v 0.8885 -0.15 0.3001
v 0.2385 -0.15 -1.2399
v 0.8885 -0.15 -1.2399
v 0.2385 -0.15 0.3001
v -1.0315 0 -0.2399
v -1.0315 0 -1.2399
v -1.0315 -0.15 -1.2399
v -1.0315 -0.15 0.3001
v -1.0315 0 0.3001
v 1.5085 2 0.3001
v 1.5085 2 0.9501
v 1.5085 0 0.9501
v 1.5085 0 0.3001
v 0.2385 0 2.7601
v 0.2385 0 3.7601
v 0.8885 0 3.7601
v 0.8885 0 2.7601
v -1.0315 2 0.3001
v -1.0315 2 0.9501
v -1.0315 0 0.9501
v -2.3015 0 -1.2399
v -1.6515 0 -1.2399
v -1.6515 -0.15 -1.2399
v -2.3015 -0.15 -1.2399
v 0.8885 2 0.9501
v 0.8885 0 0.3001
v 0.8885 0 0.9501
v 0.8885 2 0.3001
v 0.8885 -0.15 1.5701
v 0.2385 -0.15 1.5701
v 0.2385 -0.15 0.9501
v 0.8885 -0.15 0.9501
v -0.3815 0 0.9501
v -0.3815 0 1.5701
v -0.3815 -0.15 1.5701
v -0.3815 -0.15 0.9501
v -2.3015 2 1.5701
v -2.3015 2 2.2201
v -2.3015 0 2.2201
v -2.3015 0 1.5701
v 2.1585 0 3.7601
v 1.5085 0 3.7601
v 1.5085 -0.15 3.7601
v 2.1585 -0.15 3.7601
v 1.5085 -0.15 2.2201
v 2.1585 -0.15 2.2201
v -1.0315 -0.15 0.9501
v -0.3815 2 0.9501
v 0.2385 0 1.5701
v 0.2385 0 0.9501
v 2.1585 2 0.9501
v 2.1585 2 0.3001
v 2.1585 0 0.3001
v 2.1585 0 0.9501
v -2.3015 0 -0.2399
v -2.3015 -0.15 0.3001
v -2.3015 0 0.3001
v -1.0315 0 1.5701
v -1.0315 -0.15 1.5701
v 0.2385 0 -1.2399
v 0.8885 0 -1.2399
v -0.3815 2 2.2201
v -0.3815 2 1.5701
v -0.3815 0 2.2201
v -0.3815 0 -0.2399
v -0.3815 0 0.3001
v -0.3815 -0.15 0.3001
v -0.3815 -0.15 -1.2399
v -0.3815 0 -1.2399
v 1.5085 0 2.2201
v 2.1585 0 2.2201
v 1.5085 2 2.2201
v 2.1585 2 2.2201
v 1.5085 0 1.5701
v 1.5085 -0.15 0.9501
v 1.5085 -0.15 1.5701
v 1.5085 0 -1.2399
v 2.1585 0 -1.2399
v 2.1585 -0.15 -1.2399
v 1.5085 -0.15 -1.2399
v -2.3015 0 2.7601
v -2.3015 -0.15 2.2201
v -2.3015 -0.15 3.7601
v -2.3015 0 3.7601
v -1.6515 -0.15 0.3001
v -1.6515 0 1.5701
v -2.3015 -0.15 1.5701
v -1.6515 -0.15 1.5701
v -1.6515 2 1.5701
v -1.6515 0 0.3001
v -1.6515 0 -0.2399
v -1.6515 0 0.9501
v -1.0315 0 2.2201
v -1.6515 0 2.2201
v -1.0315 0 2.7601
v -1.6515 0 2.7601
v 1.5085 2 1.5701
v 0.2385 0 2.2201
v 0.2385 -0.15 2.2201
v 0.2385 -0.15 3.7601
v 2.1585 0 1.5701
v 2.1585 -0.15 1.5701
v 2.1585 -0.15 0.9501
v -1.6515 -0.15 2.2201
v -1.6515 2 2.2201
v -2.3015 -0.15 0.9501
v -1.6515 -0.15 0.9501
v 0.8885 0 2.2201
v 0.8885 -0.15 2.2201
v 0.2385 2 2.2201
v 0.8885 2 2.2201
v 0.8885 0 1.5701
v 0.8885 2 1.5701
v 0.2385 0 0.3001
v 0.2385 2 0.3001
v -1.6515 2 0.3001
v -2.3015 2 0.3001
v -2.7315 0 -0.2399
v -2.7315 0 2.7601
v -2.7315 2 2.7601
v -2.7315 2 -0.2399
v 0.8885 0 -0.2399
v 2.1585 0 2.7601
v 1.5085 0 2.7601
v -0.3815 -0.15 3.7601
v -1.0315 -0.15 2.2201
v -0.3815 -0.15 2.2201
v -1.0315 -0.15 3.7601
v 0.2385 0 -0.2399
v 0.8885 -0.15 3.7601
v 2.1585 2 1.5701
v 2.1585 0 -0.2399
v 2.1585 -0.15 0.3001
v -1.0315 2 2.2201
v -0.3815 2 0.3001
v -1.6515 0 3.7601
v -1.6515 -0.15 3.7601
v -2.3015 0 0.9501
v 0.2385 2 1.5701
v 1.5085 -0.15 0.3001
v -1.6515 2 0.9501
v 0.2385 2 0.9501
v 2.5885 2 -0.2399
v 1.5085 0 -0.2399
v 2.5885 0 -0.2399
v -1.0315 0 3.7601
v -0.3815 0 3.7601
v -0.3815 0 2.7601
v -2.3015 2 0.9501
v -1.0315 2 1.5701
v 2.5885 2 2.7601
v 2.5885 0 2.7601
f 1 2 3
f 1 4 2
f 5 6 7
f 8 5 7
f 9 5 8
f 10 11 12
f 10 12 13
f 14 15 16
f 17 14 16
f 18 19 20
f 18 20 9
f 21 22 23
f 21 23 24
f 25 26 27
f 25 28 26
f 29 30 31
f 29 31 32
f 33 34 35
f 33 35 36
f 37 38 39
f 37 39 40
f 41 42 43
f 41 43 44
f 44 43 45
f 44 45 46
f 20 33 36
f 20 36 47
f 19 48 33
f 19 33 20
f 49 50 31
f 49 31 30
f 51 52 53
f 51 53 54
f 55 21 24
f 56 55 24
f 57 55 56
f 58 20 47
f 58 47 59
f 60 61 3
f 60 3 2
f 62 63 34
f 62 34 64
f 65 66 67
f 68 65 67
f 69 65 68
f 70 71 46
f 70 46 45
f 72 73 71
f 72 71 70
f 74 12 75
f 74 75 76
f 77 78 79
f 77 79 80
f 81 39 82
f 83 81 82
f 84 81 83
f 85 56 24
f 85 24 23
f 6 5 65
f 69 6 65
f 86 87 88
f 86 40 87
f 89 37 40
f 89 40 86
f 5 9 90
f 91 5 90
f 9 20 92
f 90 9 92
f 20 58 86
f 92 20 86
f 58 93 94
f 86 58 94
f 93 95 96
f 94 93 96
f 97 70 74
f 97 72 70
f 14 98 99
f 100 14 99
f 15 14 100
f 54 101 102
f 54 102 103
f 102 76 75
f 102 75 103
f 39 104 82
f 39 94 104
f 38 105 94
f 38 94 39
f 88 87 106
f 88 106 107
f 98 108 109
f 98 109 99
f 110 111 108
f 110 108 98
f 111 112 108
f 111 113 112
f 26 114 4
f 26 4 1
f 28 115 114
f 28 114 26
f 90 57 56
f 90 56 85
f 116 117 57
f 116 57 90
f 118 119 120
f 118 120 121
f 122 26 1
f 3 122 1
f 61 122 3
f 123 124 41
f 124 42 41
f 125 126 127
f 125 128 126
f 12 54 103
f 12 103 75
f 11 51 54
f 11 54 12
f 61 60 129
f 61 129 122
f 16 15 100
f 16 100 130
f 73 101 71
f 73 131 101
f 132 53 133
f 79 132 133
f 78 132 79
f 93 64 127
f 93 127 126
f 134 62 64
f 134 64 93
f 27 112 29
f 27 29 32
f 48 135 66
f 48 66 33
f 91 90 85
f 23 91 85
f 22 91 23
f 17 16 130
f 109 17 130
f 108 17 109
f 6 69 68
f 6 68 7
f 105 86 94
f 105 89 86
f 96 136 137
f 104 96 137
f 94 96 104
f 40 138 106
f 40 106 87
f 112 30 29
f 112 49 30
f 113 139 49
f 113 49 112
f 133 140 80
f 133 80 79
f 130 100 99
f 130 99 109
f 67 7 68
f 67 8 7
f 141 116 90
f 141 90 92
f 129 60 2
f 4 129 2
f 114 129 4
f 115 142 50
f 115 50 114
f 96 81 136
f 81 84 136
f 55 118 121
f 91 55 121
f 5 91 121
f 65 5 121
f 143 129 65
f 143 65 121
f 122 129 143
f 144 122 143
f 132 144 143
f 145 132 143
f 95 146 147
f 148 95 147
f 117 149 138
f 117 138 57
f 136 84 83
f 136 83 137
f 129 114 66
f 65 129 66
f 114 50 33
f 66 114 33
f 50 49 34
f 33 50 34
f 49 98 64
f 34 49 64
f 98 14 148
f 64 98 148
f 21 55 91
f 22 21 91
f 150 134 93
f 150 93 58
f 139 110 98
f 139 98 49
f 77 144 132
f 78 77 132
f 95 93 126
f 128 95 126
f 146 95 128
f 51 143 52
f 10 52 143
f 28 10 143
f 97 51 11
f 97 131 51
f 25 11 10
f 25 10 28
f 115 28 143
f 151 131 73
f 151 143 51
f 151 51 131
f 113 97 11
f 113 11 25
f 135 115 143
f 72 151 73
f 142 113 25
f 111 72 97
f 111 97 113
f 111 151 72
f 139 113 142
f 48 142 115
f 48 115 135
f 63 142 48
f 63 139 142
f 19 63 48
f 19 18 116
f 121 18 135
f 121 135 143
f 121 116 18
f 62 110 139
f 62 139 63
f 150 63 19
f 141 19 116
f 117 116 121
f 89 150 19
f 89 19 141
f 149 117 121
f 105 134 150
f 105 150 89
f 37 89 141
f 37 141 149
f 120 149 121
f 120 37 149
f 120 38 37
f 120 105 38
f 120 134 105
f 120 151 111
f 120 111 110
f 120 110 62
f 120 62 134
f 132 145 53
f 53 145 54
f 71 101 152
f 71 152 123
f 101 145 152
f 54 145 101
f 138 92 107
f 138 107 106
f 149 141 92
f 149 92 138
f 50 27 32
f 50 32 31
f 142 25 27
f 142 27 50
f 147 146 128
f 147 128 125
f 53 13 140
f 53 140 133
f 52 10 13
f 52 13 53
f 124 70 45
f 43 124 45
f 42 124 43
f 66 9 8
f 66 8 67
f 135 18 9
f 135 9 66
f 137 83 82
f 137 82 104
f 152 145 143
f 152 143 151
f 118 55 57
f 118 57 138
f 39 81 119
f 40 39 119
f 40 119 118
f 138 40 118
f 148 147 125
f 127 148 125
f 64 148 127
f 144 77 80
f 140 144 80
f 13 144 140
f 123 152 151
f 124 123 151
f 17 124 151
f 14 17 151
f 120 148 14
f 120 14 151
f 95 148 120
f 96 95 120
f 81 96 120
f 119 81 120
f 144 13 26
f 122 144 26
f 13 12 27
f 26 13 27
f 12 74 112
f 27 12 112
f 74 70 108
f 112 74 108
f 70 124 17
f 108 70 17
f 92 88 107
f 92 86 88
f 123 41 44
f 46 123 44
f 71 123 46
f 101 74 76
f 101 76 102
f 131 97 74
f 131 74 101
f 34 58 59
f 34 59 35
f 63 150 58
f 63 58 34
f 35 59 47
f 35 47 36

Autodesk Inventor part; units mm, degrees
ref_plane "YZ Plane" through (0, 0, 0) normal (1, 0, 0) x (0, 1, 0)
ref_plane "XZ Plane" through (0, 0, 0) normal (0, 1, 0) x (-1, 0, 0)
ref_plane "XY Plane" through (0, 0, 0) normal (0, 0, 1) x (1, 0, 0)
sketch "Sketch1" plane through (0, 0, 0) normal (0, 1, 0) x (-1, 0, 0)
  line L0 (-2.5885, 2.7601) -> (2.7315, 2.7601)
  line L1 (2.7315, 2.7601) -> (2.7315, -0.2399)
  line L2 (2.7315, -0.2399) -> (-2.5885, -0.2399)
  line L3 (-2.5885, -0.2399) -> (-2.5885, 2.7601)
  point P0 (0, 0)
  dimension "d0" = 5.32
  dimension "d1" = 3
extrude "Extrusion1" add sketch "Sketch1" along normal blind 2
sketch "Sketch2" plane through (0, 0, 0) normal (0, -1, 0) x (1, 0, 0)
  line L0 (-2.7315, 2.7601) -> (-2.7315, -0.2399) projected
  line L1 (-2.7315, -0.2399) -> (2.5885, -0.2399) projected
  line L2 (-2.3015, 3.7601) -> (-1.6515, 3.7601)
  line L3 (-1.6515, 3.7601) -> (-1.6515, -1.2399)
  line L4 (-1.6515, -1.2399) -> (-2.3015, -1.2399)
  line L5 (-2.3015, -1.2399) -> (-2.3015, 3.7601)
  point P0 (0, 0)
  dimension "d4" = 5
  dimension "d5" = 0.65
  dimension "d6" = 1
  dimension "d7" = 0.43
extrude "Extrusion2" add sketch "Sketch2" along normal blind 0.15
pattern_linear "Rectangular Pattern1" count 4 spacing 1.27 along (1, 0, 0) of "Extrusion2"
sketch "Sketch3" plane through (0, 2, 0) normal (0, 1, 0) x (1, 0, 0)
  line L0 (2.5885, 0.2399) -> (-2.7315, 0.2399) projected
  line L1 (-2.7315, 0.2399) -> (-2.7315, -2.7601) projected
  line L2 (-2.3015, -0.3001) -> (-1.6515, -0.3001)
  line L3 (-1.6515, -0.3001) -> (-1.6515, -0.9501)
  line L4 (-1.6515, -0.9501) -> (-2.3015, -0.9501)
  line L5 (-2.3015, -0.9501) -> (-2.3015, -0.3001)
  point P0 (0, 0)
  dimension "d13" = 0.65
  dimension "d14" = 0.65
  dimension "d15" = 0.43
  dimension "d16" = 0.54
extrude "Extrusion3" cut sketch "Sketch3" against normal through all
pattern_linear "Rectangular Pattern2" count 4 spacing 1.27 along (1, 0, 0) count 2 spacing 1.27 along (0, 0, 1) of "Extrusion3"
properties part number "127mm2Row8PosFemale"
